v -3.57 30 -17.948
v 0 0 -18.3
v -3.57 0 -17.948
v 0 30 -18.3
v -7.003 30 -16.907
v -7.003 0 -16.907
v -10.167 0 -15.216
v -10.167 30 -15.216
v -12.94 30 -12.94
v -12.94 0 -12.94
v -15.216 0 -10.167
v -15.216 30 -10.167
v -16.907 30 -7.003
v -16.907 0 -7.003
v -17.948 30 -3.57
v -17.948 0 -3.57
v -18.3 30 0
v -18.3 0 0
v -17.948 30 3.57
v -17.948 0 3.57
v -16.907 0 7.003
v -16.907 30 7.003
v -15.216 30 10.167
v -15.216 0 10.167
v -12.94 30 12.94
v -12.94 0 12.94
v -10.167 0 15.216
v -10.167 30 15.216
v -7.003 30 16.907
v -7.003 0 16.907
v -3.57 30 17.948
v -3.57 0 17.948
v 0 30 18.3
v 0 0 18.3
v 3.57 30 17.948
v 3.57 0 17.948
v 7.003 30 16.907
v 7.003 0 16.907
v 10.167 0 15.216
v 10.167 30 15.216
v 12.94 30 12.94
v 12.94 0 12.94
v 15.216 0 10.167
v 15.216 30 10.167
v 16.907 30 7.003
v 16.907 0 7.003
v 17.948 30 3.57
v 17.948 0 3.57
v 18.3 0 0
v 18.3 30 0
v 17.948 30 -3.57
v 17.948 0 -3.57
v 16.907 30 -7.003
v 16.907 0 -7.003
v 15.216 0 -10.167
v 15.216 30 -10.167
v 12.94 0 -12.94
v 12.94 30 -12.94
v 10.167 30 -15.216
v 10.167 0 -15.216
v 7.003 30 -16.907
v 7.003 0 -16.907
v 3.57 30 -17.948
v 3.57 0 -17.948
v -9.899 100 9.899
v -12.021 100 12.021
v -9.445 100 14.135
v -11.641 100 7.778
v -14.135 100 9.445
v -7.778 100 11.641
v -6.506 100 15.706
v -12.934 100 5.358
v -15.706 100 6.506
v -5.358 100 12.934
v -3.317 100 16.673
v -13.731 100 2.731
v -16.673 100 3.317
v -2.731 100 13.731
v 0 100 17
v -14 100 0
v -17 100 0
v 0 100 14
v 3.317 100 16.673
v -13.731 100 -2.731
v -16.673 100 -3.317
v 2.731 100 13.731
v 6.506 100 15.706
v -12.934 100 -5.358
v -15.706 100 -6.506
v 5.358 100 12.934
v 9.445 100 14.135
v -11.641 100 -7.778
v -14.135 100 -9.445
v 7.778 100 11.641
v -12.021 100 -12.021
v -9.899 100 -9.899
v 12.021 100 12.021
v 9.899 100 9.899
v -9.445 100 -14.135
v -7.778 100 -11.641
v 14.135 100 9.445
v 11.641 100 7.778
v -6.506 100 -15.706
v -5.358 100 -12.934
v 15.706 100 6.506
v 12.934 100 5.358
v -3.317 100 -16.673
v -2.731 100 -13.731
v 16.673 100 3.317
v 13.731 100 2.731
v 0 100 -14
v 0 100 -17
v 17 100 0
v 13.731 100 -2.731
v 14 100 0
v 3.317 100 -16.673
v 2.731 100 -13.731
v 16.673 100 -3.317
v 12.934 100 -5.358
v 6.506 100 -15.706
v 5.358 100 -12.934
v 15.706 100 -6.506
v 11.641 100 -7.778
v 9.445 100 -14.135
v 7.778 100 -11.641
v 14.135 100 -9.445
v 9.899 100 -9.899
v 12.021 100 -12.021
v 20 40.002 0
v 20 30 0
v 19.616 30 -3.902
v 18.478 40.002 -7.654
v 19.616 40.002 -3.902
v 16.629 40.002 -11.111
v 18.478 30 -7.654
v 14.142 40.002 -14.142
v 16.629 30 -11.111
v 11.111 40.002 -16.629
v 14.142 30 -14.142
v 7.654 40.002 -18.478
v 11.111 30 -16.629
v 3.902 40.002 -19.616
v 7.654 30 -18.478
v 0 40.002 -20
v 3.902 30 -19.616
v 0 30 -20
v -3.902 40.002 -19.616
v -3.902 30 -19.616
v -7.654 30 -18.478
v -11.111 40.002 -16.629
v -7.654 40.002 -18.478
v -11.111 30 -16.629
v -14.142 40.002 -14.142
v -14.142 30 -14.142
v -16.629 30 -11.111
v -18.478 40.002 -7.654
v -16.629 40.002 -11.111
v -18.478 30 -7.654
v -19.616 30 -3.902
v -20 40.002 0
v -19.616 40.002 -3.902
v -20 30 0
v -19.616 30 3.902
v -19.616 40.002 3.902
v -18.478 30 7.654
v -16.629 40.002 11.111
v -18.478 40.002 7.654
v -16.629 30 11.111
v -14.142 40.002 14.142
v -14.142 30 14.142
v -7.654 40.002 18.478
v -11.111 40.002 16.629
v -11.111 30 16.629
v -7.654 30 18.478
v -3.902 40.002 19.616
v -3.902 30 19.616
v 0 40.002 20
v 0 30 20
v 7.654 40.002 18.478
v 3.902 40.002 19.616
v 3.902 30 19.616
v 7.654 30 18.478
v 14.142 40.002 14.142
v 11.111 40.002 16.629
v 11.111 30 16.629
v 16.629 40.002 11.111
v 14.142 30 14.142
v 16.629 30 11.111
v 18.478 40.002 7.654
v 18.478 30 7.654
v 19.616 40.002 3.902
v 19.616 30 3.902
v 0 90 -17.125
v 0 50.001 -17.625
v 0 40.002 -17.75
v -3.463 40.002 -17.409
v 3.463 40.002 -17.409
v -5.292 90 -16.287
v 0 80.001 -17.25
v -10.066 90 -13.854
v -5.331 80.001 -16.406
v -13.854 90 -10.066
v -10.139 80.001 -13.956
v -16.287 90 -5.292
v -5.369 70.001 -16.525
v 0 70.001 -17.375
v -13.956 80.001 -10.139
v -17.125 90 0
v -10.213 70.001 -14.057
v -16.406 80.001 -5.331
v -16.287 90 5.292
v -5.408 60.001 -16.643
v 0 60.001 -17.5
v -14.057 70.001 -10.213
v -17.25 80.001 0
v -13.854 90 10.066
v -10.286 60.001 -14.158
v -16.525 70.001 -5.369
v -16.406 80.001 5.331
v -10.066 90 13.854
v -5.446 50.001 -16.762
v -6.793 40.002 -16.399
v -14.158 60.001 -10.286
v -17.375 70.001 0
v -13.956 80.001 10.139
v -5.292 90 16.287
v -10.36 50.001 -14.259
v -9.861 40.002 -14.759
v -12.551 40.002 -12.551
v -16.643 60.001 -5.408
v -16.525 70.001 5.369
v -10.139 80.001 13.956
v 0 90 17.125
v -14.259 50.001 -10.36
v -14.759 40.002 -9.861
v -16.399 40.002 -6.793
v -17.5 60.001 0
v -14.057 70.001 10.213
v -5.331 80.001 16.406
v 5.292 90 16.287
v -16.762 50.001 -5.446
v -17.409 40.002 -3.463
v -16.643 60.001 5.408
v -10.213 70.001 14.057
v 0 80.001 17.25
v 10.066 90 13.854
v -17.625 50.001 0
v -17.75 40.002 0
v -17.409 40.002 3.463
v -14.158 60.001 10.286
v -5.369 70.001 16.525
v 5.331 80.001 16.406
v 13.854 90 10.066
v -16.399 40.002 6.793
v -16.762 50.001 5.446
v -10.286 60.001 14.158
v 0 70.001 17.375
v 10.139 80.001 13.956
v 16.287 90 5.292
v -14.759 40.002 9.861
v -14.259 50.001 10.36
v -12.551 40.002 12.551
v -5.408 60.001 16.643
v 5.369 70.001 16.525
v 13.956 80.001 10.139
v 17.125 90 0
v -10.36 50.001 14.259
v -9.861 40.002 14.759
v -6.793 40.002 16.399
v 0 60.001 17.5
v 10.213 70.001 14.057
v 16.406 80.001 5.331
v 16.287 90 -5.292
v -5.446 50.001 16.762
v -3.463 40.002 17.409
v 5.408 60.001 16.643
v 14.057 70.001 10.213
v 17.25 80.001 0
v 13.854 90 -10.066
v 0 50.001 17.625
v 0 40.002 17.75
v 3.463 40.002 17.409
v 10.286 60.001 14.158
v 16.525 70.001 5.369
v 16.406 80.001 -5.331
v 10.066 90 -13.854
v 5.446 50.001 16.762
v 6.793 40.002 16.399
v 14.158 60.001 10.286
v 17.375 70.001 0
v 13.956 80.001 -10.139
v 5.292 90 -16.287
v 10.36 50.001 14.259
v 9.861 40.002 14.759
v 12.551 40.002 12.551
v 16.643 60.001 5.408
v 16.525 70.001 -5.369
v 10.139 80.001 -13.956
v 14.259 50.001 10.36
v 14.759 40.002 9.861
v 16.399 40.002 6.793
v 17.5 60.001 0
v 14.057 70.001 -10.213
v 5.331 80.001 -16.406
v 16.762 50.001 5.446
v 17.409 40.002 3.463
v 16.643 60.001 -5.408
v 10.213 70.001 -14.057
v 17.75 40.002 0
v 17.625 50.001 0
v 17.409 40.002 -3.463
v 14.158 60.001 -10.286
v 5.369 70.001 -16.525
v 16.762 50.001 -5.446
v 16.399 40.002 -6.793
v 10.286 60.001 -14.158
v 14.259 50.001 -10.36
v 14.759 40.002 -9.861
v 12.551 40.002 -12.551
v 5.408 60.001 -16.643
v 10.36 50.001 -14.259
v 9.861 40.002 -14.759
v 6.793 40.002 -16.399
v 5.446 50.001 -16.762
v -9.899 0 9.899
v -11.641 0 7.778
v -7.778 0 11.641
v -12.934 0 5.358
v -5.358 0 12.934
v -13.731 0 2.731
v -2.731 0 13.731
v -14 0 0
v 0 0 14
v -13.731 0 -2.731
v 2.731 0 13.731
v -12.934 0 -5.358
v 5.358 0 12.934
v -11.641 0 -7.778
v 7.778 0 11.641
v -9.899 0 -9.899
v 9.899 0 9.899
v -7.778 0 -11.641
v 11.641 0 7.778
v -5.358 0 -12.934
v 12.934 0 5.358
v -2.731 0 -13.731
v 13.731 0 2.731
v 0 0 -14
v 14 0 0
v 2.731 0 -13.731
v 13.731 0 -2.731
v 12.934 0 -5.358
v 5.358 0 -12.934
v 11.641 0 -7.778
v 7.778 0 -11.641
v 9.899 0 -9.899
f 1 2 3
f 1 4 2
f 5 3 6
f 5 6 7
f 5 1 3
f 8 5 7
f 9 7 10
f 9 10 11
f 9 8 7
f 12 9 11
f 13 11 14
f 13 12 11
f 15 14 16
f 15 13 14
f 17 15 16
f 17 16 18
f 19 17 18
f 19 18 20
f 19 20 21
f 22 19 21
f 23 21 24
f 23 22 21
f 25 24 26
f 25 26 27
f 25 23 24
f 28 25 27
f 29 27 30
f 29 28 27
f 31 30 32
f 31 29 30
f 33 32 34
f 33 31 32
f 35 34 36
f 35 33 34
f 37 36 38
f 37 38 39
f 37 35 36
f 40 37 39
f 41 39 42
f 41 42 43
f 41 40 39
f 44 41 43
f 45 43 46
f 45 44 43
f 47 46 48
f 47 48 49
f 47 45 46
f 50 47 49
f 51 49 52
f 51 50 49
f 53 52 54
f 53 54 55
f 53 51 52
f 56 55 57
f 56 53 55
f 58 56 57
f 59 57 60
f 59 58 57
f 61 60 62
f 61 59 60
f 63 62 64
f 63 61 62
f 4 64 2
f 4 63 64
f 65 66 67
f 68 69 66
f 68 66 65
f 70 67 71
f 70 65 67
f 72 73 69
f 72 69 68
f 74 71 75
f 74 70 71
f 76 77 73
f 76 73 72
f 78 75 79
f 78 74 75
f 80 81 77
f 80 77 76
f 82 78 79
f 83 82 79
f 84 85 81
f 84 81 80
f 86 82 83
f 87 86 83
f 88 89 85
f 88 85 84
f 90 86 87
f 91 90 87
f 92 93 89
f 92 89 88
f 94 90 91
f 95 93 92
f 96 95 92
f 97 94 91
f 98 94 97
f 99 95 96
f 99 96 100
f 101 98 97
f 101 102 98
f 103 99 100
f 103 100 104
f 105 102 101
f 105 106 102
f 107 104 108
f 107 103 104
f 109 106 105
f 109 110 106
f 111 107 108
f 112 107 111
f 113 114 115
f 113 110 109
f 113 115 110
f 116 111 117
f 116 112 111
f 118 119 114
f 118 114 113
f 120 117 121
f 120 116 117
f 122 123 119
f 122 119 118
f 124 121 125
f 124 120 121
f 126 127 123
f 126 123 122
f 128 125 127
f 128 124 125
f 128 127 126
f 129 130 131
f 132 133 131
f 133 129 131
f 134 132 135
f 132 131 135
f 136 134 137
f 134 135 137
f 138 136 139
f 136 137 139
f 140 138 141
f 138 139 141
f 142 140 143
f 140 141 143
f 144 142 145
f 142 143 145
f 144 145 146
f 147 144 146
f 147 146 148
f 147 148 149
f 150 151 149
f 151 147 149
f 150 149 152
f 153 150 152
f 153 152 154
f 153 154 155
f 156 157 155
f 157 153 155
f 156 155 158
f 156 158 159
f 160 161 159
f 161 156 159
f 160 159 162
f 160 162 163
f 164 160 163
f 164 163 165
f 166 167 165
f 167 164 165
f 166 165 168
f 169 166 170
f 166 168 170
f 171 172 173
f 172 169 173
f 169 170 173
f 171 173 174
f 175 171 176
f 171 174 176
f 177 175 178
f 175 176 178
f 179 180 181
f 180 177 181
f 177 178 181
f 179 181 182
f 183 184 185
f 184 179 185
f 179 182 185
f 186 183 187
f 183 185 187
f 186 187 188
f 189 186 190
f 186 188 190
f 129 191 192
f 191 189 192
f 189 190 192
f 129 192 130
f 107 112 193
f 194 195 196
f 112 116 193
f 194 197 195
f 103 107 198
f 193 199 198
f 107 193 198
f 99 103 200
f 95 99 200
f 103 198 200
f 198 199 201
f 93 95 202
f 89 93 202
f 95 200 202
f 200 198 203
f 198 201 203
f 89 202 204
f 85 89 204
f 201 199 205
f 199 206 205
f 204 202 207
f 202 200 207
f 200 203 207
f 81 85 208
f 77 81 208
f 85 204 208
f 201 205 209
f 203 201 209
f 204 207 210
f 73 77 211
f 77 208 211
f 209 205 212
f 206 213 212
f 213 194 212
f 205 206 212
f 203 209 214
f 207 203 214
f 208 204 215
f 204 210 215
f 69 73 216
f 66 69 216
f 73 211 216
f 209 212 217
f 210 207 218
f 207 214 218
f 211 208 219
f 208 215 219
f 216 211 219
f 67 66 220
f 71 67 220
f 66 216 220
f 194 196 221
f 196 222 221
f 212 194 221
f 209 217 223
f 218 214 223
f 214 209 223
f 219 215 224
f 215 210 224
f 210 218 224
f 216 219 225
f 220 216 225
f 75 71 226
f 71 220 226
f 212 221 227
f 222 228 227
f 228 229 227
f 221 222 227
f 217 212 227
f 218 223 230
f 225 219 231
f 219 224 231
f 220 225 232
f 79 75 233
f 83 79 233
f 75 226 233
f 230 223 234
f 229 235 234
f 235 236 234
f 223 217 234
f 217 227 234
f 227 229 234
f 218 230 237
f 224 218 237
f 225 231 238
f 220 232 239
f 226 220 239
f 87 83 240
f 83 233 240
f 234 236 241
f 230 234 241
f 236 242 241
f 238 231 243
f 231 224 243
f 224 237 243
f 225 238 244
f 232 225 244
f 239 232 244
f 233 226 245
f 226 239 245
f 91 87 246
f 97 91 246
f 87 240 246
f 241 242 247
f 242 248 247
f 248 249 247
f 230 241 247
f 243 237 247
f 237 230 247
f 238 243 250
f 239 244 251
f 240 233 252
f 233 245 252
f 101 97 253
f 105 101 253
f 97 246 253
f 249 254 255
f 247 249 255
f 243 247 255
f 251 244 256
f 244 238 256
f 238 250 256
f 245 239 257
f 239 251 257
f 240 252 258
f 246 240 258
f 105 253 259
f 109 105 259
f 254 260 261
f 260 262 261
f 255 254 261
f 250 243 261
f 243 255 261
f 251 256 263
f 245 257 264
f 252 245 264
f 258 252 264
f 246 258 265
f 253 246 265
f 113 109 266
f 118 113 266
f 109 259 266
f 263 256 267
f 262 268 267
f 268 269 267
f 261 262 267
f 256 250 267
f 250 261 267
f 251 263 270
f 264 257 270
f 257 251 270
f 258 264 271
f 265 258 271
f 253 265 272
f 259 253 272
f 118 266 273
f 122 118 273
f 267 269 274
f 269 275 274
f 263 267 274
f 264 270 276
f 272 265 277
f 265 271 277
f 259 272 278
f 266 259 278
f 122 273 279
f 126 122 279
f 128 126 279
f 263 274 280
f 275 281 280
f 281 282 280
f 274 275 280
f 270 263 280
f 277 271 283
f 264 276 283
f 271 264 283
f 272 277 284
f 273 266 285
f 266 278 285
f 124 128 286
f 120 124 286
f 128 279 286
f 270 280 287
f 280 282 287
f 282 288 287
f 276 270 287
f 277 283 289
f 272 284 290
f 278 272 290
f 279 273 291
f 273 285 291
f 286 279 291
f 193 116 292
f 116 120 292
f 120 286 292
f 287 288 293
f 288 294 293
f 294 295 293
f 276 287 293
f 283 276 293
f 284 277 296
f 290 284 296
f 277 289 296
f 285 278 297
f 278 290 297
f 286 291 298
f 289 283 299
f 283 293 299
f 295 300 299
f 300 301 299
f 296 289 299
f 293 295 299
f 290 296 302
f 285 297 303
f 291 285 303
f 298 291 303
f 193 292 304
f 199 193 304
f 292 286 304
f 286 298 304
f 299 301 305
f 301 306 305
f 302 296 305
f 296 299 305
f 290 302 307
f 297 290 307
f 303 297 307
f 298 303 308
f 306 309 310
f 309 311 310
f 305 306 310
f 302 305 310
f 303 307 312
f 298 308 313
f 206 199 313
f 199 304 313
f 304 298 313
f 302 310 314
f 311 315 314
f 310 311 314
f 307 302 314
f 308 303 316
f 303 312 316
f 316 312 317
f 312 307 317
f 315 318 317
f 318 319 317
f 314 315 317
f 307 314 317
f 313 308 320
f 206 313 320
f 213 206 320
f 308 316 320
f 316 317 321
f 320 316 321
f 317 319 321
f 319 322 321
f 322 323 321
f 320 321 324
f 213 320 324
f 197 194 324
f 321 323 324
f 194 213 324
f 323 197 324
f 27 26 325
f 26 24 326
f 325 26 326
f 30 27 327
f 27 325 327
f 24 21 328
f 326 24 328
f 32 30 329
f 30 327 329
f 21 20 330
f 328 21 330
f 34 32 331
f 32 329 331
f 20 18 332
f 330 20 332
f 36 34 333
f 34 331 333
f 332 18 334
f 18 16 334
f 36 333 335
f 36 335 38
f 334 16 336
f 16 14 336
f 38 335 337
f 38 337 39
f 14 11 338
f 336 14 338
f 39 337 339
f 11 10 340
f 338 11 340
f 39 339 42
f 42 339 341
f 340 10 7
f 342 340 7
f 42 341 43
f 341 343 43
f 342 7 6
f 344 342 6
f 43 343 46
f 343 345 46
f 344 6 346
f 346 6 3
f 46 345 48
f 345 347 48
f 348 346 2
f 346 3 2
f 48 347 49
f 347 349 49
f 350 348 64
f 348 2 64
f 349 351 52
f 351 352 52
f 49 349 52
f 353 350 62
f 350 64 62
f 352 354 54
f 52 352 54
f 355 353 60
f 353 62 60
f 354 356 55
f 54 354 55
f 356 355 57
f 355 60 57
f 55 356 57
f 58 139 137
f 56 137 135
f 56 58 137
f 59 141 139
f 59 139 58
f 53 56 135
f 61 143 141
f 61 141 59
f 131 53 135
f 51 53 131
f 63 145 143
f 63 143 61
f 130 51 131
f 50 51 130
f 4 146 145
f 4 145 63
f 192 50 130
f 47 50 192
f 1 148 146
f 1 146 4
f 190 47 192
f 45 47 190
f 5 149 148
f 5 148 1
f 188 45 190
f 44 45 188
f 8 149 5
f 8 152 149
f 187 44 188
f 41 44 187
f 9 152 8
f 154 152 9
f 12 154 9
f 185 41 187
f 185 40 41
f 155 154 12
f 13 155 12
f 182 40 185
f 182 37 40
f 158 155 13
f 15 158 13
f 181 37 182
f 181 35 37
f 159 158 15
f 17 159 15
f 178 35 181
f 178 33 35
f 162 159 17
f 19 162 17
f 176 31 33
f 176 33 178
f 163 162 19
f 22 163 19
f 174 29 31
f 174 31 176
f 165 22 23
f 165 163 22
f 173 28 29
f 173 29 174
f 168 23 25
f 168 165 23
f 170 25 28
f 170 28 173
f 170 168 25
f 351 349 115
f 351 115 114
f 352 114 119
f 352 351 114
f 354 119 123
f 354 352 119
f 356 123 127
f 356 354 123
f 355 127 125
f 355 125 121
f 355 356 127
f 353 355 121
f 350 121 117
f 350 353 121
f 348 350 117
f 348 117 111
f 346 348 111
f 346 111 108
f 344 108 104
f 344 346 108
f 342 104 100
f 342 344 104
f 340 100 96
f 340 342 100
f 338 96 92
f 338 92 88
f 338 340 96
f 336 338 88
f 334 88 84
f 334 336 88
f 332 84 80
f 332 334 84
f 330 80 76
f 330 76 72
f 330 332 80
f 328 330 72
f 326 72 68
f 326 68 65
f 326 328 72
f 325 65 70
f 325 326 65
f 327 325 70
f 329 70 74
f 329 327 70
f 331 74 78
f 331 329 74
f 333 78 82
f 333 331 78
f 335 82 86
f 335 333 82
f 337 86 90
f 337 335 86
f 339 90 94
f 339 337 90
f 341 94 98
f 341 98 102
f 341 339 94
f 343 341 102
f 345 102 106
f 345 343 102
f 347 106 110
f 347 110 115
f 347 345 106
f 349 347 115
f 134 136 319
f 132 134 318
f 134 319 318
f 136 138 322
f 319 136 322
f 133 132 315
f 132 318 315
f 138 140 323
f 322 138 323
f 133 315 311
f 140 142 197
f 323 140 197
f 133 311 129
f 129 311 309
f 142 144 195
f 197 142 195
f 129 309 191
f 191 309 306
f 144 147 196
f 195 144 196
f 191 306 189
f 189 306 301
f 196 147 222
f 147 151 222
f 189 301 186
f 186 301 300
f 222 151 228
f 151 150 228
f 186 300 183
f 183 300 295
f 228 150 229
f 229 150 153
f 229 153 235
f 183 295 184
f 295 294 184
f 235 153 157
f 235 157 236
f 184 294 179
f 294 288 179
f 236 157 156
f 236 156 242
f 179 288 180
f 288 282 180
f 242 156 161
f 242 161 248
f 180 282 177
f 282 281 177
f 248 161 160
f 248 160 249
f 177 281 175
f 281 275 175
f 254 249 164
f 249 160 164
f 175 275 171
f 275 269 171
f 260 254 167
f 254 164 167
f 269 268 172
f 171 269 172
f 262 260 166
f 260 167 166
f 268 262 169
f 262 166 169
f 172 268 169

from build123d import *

# Parameters (mm, degrees)
SKETCH_1_R      = 20
SKETCH_1_R_2    = 14
EXTRUDE_1_DEPTH = 100
SKETCH_2_W      = 1.7
SKETCH_2_H      = 30


with BuildPart() as part:
    # Эскиз1 → Вытянуть-Тонкостенный1 (new body)
    with BuildSketch(Plane(origin=(0, 0, 0), x_dir=(1, 0, 0), z_dir=(0, 1, 0))):
        Circle(SKETCH_1_R)
        Circle(SKETCH_1_R_2, mode=Mode.SUBTRACT)
    extrude(amount=EXTRUDE_1_DEPTH)

    # Эскиз2 → Вырез-Повернуть1 (revolve, cut)
    with BuildSketch(Plane(origin=(0, 0, 0), x_dir=(0, 0, -1), z_dir=(1, 0, 0))):
        with Locations((19.15, 15)):
            Rectangle(SKETCH_2_W, SKETCH_2_H)
        Polygon((17, 100), (17.749980471, 40.001562317), (20, 40.001562317), (20, 100), align=None)
    revolve(axis=Axis((0, -5.85508708, 0), (0, 1, 0)), mode=Mode.SUBTRACT)


solid = part.part
